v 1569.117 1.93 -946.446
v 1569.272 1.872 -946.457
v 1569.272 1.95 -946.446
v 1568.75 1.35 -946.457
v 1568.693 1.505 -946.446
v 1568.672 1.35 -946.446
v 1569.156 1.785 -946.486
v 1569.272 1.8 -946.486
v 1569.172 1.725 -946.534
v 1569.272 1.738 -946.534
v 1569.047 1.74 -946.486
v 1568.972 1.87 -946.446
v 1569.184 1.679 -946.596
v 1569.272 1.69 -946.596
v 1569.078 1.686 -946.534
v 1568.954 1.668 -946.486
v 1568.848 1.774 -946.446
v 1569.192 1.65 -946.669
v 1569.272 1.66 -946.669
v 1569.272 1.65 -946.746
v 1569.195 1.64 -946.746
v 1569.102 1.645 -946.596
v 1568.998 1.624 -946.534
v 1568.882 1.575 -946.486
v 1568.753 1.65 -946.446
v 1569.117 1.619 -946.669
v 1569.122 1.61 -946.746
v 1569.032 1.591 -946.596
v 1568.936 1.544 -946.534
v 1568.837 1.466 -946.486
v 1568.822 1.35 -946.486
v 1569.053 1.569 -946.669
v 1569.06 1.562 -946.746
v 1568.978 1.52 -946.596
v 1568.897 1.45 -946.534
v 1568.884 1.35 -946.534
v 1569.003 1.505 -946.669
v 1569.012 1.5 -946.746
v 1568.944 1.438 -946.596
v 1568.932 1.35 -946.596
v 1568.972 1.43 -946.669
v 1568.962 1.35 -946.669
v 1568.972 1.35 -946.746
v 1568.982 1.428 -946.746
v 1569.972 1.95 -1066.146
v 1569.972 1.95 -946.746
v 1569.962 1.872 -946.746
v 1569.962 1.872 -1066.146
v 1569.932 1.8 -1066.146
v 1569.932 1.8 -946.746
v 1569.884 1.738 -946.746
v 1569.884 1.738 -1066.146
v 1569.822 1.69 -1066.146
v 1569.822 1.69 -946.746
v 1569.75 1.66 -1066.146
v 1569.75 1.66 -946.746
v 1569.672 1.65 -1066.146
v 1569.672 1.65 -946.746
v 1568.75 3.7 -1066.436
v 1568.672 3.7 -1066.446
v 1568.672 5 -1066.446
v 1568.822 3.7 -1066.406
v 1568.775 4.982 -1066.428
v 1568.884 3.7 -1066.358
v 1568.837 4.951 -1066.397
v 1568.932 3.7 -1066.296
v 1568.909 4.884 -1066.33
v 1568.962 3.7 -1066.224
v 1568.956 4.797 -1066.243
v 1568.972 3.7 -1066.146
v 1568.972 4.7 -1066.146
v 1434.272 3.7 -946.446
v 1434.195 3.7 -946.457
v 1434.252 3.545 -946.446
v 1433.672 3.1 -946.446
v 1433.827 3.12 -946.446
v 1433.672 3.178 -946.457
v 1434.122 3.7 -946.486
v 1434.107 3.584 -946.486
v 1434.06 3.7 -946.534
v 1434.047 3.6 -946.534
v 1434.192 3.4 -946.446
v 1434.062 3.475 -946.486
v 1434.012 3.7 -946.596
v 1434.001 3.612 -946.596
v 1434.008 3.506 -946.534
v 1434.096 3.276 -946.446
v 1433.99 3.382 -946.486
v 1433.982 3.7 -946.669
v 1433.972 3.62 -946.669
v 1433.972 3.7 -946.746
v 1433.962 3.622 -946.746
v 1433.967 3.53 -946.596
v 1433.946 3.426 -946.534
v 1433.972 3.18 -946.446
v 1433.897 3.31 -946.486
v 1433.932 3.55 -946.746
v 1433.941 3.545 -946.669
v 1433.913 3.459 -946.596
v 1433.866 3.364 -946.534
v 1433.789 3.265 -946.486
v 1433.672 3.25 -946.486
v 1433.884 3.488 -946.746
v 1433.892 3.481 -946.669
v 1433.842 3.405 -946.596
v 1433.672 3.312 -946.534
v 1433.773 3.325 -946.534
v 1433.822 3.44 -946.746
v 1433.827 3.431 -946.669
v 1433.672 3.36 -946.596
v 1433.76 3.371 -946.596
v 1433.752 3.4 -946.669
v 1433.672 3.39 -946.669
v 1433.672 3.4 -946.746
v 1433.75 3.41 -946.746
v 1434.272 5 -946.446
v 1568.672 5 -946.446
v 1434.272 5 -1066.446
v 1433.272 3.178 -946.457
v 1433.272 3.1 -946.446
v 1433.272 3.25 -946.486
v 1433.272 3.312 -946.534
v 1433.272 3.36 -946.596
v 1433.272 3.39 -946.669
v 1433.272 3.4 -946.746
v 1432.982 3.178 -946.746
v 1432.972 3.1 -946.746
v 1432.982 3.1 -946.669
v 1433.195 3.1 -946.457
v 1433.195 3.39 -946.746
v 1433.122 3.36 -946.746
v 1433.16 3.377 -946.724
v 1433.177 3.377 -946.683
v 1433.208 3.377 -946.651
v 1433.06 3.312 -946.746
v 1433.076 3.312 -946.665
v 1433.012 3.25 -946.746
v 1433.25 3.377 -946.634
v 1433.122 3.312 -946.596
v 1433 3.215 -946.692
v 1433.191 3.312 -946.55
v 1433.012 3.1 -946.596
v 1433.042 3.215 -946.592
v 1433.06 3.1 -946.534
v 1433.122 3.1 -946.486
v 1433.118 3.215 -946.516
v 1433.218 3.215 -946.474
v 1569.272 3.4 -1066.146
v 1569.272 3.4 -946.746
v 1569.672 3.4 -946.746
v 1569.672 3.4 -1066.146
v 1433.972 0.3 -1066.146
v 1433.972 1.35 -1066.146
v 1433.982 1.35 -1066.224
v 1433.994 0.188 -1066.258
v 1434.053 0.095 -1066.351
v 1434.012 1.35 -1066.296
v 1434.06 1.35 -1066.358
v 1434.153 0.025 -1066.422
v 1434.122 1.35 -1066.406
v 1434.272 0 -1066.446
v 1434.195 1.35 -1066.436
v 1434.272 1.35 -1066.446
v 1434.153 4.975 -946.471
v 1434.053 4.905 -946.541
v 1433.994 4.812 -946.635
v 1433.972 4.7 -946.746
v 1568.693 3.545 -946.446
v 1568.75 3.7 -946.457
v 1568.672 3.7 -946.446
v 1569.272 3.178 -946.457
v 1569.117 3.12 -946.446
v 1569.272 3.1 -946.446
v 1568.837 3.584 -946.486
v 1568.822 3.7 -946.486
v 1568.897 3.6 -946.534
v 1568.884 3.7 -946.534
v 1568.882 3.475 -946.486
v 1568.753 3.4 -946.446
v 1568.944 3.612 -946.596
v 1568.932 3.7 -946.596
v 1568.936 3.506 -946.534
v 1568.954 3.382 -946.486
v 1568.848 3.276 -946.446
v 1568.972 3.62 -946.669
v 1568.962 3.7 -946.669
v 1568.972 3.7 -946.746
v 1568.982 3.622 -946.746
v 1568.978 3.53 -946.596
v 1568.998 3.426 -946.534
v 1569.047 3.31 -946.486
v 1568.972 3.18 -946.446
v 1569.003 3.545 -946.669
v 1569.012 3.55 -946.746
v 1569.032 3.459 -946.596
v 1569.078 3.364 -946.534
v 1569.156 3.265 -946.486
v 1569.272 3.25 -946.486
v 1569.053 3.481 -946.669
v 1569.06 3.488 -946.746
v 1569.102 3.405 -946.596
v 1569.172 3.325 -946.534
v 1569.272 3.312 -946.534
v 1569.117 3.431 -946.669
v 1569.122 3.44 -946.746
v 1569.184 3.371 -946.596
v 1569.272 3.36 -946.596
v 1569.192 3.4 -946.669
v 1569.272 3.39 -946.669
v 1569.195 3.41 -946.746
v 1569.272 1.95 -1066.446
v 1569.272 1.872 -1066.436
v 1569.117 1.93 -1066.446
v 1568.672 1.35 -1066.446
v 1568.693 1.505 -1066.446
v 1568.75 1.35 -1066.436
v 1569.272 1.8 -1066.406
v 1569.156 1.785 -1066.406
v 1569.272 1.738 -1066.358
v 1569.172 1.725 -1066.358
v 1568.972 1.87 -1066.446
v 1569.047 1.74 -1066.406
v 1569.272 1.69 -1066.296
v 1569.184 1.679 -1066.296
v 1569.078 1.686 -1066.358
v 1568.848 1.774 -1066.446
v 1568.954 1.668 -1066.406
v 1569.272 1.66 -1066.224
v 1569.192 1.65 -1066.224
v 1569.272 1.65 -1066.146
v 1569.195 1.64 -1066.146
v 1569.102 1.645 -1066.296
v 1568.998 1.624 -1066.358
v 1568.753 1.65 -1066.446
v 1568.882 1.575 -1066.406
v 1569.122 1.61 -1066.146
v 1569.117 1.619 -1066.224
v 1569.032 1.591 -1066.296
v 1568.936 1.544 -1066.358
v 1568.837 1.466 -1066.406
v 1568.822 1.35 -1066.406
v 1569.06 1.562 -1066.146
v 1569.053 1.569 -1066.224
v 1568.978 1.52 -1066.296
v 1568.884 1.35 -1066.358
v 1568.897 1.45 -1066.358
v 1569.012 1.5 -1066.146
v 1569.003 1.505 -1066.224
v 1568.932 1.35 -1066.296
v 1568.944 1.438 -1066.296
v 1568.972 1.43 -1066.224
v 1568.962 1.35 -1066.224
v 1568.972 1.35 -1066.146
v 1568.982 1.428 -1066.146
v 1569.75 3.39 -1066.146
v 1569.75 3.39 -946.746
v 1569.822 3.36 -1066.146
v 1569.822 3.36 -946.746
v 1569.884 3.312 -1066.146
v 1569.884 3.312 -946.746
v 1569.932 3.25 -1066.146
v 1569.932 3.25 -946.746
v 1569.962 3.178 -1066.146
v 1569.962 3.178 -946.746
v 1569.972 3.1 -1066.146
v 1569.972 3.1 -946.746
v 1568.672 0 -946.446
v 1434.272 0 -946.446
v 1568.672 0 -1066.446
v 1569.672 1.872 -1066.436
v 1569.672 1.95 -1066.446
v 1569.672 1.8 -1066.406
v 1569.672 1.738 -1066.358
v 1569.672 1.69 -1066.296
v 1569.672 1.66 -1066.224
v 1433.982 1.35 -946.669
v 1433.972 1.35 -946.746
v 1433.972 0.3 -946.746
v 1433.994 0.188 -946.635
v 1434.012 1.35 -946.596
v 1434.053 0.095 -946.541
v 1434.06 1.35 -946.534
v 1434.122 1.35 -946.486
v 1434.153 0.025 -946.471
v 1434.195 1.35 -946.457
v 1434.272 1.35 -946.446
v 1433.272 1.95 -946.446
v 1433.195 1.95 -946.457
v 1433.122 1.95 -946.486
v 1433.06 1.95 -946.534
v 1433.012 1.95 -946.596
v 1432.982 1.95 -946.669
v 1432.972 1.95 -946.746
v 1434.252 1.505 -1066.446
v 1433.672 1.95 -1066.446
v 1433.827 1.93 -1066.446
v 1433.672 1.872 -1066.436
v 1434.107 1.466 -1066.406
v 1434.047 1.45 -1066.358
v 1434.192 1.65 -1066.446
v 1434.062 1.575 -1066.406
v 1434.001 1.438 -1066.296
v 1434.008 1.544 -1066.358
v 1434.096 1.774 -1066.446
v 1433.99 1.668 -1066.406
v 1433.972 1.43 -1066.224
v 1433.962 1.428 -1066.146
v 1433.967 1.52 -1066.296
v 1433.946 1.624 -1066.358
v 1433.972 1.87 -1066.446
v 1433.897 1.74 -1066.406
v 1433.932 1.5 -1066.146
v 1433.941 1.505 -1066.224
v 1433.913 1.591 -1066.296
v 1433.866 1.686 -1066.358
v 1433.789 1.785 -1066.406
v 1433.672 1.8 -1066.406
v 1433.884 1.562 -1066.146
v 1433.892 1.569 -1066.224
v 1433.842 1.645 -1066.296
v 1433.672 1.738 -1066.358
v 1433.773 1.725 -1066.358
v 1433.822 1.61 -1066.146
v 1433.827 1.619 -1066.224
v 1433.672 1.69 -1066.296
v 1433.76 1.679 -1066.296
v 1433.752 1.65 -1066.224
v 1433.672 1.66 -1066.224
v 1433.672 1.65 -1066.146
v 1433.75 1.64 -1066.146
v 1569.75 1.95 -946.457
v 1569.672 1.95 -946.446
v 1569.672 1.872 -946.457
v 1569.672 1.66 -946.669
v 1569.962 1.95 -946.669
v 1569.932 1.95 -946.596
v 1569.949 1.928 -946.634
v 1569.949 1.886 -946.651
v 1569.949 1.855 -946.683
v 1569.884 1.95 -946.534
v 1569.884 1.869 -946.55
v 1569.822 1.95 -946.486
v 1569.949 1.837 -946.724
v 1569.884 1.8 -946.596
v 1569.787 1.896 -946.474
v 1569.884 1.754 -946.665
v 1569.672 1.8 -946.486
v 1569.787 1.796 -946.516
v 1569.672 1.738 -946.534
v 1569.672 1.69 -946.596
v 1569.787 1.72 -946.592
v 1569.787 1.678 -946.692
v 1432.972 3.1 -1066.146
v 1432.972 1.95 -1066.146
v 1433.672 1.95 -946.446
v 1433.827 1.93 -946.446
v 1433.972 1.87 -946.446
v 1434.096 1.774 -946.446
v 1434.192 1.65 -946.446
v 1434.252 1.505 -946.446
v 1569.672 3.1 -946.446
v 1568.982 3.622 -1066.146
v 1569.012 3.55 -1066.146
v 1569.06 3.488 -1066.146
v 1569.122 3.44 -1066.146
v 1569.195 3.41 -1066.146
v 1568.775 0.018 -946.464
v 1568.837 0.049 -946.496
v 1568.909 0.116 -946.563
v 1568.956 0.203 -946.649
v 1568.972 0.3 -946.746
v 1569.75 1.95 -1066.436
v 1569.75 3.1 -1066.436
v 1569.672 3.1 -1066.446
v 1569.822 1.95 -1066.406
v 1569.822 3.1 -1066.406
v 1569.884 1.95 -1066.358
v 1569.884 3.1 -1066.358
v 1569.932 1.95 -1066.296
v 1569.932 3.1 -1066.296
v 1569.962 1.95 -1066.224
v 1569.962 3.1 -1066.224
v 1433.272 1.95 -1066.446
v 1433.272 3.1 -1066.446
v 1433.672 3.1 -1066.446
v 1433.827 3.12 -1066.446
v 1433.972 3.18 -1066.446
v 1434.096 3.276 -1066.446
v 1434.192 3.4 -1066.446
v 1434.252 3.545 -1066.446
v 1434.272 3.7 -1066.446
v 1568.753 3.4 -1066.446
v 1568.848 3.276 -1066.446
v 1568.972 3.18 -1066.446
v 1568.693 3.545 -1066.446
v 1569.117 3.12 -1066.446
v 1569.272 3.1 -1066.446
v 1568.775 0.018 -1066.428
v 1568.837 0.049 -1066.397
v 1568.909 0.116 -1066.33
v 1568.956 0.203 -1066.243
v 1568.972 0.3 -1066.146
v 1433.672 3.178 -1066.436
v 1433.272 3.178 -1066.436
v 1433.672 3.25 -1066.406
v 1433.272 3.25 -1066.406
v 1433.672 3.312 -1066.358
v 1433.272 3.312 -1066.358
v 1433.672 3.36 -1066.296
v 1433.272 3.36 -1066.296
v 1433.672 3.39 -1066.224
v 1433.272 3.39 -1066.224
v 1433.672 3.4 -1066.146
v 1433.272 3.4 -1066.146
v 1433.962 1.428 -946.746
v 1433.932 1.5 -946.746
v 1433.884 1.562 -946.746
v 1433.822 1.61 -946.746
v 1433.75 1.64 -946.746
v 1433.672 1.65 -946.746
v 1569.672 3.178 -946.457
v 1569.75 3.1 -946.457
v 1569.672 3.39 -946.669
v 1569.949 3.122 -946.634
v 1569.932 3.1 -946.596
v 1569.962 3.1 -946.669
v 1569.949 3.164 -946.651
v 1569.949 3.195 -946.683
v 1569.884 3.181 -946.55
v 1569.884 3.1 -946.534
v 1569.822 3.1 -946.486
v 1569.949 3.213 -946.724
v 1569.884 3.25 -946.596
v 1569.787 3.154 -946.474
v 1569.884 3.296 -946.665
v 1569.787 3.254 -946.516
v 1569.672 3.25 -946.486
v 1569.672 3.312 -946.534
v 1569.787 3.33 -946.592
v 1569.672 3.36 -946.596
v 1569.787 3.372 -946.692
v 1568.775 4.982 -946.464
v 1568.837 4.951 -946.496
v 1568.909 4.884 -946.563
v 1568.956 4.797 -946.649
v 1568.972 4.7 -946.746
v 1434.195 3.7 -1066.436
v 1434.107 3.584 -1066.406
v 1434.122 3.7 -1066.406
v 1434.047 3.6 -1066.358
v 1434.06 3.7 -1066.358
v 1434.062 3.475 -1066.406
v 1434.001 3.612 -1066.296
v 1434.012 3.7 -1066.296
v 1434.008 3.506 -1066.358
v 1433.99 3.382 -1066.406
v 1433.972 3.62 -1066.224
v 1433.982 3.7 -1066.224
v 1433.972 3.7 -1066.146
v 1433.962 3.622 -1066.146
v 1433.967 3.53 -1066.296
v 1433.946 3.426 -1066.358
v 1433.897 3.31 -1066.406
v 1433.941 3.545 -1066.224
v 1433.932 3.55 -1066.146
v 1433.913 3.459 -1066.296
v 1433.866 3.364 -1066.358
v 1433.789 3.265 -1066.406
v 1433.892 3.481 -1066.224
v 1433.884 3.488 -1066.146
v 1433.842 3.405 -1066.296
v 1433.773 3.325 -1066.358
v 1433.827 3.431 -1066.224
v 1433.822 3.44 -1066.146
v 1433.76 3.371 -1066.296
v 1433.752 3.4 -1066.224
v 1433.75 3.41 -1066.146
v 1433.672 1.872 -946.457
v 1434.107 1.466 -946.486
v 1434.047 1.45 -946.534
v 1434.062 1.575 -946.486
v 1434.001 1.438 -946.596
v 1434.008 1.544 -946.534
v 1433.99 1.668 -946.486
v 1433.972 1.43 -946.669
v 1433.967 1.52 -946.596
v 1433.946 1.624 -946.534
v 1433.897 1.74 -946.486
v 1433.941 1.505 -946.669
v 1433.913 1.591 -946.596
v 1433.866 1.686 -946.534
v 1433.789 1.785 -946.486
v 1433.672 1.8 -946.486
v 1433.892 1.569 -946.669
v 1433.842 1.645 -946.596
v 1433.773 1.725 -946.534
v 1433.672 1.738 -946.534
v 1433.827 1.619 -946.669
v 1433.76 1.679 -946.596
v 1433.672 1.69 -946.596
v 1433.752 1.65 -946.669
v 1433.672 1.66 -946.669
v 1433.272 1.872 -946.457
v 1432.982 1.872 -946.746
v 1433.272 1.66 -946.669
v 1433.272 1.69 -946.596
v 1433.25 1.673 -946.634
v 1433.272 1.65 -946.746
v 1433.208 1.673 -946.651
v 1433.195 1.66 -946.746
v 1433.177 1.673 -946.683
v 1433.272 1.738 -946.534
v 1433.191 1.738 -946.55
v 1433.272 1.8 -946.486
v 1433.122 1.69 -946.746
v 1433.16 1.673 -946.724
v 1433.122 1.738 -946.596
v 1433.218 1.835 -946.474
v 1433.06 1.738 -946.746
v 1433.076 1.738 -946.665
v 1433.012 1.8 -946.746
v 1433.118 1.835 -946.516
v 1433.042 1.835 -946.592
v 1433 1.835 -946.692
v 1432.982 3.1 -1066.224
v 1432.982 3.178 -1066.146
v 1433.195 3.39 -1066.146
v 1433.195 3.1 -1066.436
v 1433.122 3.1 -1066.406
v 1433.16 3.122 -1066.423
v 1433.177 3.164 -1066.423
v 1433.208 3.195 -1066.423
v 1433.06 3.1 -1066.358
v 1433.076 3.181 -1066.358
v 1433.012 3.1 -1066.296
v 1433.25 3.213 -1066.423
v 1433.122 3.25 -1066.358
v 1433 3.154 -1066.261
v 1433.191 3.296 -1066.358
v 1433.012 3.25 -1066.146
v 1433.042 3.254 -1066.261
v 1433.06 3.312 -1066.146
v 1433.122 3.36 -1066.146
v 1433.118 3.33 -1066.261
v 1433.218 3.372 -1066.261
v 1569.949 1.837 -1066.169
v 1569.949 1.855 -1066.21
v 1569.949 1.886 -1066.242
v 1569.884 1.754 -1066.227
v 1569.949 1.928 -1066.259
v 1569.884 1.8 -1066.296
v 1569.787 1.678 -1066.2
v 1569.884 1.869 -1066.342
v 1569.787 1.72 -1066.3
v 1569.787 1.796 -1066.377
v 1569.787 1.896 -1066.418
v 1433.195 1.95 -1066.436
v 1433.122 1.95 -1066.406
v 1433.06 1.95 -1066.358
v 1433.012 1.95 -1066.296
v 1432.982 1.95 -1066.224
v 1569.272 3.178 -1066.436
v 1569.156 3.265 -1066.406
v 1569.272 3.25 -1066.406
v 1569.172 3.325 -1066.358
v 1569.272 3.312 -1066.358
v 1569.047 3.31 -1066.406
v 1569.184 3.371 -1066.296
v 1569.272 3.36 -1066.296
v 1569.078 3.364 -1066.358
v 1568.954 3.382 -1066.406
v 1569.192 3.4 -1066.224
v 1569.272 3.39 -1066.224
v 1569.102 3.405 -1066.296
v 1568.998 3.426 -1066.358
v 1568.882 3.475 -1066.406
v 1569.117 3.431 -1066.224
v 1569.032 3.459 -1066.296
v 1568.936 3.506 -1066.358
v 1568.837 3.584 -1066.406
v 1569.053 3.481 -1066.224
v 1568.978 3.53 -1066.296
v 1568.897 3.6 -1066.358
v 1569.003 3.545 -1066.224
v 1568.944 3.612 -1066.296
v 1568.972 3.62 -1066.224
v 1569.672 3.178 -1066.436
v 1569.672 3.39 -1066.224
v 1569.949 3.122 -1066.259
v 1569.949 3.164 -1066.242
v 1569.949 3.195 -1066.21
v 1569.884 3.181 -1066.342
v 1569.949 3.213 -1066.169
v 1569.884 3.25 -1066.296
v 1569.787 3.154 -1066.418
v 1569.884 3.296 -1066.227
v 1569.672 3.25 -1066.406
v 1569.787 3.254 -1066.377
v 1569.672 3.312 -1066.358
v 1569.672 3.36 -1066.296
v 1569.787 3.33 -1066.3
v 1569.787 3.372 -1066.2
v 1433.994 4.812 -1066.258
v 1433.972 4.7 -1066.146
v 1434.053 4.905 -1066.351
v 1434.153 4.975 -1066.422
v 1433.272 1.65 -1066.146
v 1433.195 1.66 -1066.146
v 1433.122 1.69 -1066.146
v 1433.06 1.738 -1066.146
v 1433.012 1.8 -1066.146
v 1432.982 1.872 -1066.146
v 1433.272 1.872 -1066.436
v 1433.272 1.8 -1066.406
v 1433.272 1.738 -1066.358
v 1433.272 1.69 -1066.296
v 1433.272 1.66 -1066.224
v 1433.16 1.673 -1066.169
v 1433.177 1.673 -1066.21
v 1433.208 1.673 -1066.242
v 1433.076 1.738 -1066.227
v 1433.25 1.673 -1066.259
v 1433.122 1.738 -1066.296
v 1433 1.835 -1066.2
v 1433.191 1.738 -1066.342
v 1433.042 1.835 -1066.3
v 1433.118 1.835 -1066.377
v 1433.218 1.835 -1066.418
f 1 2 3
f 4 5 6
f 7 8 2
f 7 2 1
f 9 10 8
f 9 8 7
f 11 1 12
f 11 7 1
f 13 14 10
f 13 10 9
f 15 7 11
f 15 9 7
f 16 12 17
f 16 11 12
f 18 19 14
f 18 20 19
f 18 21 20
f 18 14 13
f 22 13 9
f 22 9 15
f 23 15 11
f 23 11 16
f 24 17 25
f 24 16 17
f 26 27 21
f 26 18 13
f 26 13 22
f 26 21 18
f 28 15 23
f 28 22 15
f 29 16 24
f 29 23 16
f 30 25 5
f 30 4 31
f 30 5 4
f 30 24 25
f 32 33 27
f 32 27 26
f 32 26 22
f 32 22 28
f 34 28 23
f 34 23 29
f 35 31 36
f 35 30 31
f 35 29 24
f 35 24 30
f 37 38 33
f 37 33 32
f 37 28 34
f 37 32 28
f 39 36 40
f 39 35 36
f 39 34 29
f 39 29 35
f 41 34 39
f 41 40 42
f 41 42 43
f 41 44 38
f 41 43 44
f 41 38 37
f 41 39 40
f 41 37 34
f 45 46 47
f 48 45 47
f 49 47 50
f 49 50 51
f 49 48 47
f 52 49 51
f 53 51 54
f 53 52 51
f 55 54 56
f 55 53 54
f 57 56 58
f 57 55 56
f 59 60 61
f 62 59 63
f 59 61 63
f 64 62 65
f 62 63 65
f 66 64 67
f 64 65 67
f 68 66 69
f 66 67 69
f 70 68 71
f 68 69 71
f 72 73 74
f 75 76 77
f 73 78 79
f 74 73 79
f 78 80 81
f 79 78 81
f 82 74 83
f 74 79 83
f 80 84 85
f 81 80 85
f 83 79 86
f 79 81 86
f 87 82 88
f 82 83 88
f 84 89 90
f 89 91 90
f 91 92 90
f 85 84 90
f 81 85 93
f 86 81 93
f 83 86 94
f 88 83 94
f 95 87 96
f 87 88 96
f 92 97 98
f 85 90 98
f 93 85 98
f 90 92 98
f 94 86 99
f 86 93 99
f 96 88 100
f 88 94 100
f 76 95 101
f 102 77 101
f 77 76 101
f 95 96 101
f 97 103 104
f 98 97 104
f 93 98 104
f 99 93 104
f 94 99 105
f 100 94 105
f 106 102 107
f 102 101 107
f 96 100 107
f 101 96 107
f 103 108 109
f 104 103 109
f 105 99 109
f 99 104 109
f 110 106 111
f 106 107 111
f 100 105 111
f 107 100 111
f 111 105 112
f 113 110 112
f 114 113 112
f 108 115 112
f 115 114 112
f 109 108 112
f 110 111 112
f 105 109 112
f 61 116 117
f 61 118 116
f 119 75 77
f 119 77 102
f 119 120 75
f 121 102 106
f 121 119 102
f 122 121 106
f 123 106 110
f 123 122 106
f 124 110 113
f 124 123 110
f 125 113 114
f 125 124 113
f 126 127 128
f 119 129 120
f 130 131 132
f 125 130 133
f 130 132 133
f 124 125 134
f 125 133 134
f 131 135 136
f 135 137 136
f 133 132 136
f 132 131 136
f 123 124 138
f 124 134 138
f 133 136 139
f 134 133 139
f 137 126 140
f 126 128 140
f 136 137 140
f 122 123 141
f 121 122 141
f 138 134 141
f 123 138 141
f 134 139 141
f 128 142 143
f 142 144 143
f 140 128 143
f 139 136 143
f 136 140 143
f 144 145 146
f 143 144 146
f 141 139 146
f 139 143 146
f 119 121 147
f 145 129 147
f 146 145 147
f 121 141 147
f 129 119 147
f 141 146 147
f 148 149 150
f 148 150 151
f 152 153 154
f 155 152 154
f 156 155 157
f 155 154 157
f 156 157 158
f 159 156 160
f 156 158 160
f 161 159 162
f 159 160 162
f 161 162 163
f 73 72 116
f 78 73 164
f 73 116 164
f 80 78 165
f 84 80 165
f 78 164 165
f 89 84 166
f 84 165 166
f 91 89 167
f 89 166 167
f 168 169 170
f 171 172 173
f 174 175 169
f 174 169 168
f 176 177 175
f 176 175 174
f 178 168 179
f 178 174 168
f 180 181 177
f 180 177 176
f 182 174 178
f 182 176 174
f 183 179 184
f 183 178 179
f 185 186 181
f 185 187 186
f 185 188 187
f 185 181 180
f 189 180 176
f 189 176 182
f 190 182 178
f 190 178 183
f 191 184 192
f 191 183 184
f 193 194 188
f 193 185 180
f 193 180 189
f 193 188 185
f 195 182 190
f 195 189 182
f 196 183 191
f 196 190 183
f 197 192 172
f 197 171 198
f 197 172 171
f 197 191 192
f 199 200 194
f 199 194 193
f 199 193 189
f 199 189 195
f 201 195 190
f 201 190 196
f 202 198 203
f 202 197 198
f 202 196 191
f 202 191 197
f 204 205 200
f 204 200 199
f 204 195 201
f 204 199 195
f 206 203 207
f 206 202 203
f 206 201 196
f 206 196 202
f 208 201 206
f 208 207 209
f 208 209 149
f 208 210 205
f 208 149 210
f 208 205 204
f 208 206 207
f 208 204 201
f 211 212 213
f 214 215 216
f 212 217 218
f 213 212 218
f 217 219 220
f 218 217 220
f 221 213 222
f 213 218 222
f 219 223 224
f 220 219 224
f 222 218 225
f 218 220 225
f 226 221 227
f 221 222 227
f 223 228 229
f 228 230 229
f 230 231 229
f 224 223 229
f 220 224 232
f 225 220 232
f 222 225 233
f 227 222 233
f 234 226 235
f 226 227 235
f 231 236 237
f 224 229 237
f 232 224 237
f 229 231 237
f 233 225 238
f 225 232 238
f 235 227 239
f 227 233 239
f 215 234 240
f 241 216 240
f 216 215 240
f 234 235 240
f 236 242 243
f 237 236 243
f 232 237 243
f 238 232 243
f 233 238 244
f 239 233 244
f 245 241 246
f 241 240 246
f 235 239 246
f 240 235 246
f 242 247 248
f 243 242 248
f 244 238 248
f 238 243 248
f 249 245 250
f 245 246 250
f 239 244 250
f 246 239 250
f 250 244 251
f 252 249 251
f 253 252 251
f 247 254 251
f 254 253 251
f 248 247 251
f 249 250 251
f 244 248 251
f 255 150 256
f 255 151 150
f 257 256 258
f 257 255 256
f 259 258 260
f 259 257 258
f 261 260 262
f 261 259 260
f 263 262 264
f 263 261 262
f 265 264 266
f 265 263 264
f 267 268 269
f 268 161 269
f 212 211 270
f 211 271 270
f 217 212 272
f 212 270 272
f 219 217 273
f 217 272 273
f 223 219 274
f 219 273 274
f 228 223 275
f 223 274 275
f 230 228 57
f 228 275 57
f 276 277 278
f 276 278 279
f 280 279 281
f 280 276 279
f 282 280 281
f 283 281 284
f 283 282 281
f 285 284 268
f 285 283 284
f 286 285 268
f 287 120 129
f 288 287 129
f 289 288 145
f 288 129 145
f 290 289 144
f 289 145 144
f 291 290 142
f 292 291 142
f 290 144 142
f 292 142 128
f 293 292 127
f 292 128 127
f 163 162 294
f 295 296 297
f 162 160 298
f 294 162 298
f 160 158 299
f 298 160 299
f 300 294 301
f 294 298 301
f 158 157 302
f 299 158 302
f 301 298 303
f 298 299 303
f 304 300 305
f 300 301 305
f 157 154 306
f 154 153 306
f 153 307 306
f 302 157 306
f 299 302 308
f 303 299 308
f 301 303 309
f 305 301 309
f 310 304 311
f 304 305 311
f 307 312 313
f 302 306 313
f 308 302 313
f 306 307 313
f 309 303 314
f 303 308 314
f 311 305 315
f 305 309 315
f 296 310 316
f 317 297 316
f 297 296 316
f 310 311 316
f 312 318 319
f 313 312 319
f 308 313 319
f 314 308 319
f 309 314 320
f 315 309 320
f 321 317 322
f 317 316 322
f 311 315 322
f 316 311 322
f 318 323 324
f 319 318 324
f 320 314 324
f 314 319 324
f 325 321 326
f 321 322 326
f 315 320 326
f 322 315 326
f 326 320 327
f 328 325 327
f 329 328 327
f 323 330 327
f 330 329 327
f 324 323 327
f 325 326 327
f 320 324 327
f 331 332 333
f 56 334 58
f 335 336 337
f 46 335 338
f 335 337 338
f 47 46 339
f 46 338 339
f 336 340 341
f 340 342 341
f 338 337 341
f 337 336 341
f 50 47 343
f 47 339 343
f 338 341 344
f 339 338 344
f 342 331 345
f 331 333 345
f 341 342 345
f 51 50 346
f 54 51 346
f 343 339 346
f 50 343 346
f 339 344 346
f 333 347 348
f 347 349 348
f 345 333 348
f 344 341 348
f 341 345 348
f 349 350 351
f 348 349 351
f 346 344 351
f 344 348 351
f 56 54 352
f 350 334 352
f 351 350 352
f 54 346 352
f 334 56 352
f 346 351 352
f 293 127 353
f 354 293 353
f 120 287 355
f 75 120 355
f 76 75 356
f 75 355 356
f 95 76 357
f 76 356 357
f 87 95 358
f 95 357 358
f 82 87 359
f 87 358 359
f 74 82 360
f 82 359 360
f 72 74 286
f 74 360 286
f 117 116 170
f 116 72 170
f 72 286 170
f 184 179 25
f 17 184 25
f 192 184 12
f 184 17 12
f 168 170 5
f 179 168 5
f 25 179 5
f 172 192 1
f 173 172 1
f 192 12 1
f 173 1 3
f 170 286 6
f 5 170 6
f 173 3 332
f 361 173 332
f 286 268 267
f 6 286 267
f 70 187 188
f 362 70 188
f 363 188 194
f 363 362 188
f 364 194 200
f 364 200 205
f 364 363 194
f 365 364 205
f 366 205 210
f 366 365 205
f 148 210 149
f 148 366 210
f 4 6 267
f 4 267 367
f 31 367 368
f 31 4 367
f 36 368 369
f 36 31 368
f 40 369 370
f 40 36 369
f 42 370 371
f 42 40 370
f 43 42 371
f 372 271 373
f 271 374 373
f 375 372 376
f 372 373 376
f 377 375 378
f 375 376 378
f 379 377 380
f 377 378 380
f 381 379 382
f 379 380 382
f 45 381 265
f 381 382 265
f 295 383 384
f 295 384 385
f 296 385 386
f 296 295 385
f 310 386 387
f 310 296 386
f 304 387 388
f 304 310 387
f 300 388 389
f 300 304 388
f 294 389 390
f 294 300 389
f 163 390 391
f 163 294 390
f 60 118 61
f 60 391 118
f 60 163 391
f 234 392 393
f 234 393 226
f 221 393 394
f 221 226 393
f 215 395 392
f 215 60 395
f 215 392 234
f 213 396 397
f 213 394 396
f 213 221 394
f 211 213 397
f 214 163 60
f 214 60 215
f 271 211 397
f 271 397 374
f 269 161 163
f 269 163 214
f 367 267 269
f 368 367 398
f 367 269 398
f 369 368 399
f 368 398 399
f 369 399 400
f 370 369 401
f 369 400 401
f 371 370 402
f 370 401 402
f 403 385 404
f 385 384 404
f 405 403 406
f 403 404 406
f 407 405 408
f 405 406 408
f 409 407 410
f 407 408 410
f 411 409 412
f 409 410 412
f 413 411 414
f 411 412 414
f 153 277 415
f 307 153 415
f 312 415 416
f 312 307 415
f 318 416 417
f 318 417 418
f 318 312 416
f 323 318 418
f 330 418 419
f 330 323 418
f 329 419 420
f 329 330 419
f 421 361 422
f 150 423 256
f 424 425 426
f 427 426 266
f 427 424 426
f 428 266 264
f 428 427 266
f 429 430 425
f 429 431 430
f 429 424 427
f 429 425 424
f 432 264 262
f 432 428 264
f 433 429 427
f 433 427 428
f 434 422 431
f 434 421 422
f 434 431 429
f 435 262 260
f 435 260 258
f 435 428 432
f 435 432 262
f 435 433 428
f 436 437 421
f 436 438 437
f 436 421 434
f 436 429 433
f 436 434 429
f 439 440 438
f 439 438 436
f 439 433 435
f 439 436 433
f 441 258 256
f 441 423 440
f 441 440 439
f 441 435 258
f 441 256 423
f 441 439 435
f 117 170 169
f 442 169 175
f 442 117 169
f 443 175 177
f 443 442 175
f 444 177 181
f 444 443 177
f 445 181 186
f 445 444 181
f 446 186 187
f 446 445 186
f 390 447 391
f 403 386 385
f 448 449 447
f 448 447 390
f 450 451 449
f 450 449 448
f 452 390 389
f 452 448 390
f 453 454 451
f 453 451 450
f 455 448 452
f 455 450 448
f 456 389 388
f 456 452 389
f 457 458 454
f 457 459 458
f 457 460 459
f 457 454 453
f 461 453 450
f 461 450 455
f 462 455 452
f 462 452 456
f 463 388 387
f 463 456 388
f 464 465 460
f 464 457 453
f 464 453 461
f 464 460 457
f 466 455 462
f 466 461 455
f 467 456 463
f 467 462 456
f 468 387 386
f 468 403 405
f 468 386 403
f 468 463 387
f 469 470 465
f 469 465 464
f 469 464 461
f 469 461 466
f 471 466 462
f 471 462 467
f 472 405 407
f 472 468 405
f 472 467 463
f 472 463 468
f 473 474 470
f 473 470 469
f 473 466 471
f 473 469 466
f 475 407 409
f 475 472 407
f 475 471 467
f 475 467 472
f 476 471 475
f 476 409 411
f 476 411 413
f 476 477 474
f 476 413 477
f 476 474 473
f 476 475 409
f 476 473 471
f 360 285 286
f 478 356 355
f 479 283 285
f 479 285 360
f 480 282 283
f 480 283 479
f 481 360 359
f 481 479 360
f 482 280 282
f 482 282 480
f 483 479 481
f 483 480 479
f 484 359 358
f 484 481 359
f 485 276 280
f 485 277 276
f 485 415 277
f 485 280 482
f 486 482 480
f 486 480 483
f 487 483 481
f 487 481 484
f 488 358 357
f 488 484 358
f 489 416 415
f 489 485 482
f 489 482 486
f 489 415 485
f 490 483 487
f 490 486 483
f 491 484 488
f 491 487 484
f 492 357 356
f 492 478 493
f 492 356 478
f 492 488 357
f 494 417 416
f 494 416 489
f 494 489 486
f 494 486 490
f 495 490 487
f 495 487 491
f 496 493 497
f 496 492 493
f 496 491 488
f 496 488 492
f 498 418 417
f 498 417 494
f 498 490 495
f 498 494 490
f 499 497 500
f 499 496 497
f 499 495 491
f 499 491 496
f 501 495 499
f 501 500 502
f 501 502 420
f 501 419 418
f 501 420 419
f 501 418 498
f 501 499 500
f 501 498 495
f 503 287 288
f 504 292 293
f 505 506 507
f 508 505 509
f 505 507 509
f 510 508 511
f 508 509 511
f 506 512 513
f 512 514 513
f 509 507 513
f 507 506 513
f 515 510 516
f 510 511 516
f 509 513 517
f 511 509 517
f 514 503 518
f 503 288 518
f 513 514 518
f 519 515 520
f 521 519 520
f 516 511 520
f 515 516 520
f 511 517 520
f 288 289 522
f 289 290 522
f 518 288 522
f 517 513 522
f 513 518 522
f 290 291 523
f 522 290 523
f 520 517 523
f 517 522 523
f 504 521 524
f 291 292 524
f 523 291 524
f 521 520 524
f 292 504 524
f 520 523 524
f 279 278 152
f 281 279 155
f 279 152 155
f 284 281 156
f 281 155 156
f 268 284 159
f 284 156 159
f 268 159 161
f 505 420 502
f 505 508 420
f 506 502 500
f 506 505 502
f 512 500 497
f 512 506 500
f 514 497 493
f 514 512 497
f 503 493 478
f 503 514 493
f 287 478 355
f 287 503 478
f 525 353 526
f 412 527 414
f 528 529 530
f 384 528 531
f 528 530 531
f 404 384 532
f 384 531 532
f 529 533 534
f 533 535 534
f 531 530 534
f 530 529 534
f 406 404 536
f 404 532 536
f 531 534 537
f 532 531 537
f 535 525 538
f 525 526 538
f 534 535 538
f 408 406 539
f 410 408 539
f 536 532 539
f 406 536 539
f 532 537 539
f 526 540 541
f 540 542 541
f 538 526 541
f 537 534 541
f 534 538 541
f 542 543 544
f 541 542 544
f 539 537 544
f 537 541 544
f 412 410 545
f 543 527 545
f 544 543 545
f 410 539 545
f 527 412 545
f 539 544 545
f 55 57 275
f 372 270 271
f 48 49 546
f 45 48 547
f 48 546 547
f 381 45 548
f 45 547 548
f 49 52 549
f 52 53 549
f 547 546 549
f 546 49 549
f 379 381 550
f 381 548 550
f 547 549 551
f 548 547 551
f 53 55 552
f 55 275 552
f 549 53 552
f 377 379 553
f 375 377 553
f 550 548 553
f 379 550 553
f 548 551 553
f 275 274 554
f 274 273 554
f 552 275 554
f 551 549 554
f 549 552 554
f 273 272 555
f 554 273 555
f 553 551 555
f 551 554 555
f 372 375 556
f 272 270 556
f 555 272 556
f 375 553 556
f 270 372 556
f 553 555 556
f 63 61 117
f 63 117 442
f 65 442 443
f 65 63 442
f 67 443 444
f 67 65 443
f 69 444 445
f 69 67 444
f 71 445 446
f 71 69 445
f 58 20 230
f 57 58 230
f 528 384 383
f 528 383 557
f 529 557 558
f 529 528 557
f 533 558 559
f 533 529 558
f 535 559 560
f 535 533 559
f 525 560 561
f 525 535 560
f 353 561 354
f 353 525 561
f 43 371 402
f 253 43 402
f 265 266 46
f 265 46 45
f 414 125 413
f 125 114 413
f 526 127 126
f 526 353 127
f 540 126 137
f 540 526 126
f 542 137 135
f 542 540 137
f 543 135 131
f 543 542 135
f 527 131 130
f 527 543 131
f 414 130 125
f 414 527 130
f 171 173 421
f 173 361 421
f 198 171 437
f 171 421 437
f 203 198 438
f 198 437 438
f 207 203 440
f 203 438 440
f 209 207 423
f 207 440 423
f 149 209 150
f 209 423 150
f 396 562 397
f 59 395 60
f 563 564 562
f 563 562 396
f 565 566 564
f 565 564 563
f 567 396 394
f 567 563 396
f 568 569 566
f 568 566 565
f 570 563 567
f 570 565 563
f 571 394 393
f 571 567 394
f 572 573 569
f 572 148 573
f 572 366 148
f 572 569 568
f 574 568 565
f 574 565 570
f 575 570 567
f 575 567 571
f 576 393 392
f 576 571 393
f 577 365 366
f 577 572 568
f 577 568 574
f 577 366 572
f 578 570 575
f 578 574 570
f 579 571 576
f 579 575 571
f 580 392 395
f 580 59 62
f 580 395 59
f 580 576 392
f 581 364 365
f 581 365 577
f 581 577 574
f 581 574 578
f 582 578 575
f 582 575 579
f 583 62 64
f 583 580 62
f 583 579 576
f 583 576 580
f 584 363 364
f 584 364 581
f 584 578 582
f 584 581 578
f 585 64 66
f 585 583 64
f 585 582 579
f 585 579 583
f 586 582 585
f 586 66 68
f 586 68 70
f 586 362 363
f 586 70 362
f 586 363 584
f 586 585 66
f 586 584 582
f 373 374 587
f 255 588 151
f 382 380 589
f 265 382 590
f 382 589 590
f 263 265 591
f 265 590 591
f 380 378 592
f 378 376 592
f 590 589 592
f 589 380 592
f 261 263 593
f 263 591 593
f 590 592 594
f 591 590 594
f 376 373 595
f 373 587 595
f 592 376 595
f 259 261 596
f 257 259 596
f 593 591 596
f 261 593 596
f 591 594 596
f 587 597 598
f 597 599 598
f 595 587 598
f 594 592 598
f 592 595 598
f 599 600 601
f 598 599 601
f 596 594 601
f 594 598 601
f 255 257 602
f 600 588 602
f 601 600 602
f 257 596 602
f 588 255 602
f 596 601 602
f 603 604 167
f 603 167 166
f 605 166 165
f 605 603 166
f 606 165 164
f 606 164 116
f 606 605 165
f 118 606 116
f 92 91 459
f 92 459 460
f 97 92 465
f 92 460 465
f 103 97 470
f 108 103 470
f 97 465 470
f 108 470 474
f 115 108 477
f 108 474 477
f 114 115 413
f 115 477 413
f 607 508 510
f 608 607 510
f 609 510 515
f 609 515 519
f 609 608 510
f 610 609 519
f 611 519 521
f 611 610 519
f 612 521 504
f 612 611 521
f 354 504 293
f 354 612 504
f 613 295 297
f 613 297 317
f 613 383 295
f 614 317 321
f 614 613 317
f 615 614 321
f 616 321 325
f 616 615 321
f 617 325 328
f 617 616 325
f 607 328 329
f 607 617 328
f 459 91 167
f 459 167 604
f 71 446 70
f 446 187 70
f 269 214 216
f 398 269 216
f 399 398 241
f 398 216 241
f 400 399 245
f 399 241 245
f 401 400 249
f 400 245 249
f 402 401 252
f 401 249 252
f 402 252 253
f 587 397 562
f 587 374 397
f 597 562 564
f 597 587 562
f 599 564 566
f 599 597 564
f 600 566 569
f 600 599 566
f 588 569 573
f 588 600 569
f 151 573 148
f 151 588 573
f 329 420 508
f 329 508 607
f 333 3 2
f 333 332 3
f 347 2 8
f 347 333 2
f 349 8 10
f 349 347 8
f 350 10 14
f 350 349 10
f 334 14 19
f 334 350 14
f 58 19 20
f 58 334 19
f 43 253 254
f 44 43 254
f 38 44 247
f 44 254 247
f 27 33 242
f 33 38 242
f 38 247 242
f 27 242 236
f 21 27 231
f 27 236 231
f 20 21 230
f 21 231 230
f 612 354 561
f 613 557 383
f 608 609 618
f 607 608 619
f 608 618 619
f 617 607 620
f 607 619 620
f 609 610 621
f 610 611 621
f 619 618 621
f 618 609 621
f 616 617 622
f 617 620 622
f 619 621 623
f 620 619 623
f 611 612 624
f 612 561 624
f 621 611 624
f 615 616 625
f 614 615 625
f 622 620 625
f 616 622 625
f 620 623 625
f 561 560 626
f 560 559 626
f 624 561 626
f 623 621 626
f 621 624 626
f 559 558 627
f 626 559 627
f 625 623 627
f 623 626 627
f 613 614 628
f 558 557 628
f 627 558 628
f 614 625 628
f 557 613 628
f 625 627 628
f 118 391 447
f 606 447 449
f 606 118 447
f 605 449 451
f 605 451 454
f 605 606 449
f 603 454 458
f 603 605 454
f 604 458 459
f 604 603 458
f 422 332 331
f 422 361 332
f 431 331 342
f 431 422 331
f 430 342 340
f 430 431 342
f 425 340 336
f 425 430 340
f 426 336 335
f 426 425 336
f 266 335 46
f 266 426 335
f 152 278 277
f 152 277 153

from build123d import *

# Parameters (mm, degrees)
SKETCH1_W           = 135
SKETCH1_H           = 120
BOSS_EXTRUDE1_DEPTH = 5
SKETCH2_W           = 120
SKETCH2_H           = 1.75
BOSS_EXTRUDE2_DEPTH = 1
FILLET1_R           = 0.3


with BuildPart() as part:
    # Sketch1 → Boss-Extrude1 (new body)
    with BuildSketch(Plane(origin=(0, 0, 0), x_dir=(1, 0, 0), z_dir=(0, 1, 0))):
        with Locations((1501.472148541, 1006.446286472)):
            Rectangle(SKETCH1_W, SKETCH1_H)
    extrude(amount=BOSS_EXTRUDE1_DEPTH)

    # Sketch2 → Boss-Extrude2 (add)
    with BuildSketch(Plane(origin=(1568.972148541, 0, 0), x_dir=(0, 0, -1), z_dir=(1, 0, 0))):
        with Locations((1006.446286472, 2.525)):
            Rectangle(SKETCH2_W, SKETCH2_H)
    boss_extrude2 = extrude(amount=BOSS_EXTRUDE2_DEPTH)

    # Mirror1: Boss-Extrude2 across plane
    add(boss_extrude2.mirror(Plane.ZY.offset(-1501.472148541)))

    # Fillet1
    fillet1_edges = [part.edges().sort_by_distance(p)[0] for p in [
        (1568.972148541, 5, -1006.446286472),
        (1568.972148541, 0.825, -1066.446286472),
        (1568.972148541, 0.825, -946.446286472),
        (1569.472148541, 3.4, -946.446286472),
        (1568.972148541, 1.65, -1006.446286472),
        (1569.472148541, 1.65, -946.446286472),
        (1569.472148541, 1.65, -1066.446286472),
        (1568.972148541, 3.4, -1006.446286472),
        (1569.472148541, 3.4, -1066.446286472),
        (1569.972148541, 2.525, -946.446286472),
        (1569.972148541, 1.65, -1006.446286472),
        (1569.972148541, 2.525, -1066.446286472),
        (1569.972148541, 3.4, -1006.446286472),
        (1433.972148541, 0.825, -946.446286472),
        (1433.972148541, 0.825, -1066.446286472),
        (1432.972148541, 2.525, -946.446286472),
        (1433.472148541, 1.65, -946.446286472),
        (1432.972148541, 3.4, -1006.446286472),
        (1433.472148541, 3.4, -946.446286472),
        (1432.972148541, 2.525, -1066.446286472),
        (1433.472148541, 3.4, -1066.446286472),
        (1432.972148541, 1.65, -1006.446286472),
        (1433.472148541, 1.65, -1066.446286472),
        (1433.972148541, 1.65, -1006.446286472),
        (1433.972148541, 3.4, -1006.446286472),
        (1433.972148541, 5, -1006.446286472),
        (1568.972148541, 0, -1006.446286472),
        (1433.972148541, 0, -1006.446286472),
        (1433.972148541, 4.2, -1066.446286472),
        (1568.972148541, 4.2, -1066.446286472),
        (1568.972148541, 4.2, -946.446286472),
        (1433.972148541, 4.2, -946.446286472),
    ]]
    fillet(fillet1_edges, radius=FILLET1_R)


solid = part.part
